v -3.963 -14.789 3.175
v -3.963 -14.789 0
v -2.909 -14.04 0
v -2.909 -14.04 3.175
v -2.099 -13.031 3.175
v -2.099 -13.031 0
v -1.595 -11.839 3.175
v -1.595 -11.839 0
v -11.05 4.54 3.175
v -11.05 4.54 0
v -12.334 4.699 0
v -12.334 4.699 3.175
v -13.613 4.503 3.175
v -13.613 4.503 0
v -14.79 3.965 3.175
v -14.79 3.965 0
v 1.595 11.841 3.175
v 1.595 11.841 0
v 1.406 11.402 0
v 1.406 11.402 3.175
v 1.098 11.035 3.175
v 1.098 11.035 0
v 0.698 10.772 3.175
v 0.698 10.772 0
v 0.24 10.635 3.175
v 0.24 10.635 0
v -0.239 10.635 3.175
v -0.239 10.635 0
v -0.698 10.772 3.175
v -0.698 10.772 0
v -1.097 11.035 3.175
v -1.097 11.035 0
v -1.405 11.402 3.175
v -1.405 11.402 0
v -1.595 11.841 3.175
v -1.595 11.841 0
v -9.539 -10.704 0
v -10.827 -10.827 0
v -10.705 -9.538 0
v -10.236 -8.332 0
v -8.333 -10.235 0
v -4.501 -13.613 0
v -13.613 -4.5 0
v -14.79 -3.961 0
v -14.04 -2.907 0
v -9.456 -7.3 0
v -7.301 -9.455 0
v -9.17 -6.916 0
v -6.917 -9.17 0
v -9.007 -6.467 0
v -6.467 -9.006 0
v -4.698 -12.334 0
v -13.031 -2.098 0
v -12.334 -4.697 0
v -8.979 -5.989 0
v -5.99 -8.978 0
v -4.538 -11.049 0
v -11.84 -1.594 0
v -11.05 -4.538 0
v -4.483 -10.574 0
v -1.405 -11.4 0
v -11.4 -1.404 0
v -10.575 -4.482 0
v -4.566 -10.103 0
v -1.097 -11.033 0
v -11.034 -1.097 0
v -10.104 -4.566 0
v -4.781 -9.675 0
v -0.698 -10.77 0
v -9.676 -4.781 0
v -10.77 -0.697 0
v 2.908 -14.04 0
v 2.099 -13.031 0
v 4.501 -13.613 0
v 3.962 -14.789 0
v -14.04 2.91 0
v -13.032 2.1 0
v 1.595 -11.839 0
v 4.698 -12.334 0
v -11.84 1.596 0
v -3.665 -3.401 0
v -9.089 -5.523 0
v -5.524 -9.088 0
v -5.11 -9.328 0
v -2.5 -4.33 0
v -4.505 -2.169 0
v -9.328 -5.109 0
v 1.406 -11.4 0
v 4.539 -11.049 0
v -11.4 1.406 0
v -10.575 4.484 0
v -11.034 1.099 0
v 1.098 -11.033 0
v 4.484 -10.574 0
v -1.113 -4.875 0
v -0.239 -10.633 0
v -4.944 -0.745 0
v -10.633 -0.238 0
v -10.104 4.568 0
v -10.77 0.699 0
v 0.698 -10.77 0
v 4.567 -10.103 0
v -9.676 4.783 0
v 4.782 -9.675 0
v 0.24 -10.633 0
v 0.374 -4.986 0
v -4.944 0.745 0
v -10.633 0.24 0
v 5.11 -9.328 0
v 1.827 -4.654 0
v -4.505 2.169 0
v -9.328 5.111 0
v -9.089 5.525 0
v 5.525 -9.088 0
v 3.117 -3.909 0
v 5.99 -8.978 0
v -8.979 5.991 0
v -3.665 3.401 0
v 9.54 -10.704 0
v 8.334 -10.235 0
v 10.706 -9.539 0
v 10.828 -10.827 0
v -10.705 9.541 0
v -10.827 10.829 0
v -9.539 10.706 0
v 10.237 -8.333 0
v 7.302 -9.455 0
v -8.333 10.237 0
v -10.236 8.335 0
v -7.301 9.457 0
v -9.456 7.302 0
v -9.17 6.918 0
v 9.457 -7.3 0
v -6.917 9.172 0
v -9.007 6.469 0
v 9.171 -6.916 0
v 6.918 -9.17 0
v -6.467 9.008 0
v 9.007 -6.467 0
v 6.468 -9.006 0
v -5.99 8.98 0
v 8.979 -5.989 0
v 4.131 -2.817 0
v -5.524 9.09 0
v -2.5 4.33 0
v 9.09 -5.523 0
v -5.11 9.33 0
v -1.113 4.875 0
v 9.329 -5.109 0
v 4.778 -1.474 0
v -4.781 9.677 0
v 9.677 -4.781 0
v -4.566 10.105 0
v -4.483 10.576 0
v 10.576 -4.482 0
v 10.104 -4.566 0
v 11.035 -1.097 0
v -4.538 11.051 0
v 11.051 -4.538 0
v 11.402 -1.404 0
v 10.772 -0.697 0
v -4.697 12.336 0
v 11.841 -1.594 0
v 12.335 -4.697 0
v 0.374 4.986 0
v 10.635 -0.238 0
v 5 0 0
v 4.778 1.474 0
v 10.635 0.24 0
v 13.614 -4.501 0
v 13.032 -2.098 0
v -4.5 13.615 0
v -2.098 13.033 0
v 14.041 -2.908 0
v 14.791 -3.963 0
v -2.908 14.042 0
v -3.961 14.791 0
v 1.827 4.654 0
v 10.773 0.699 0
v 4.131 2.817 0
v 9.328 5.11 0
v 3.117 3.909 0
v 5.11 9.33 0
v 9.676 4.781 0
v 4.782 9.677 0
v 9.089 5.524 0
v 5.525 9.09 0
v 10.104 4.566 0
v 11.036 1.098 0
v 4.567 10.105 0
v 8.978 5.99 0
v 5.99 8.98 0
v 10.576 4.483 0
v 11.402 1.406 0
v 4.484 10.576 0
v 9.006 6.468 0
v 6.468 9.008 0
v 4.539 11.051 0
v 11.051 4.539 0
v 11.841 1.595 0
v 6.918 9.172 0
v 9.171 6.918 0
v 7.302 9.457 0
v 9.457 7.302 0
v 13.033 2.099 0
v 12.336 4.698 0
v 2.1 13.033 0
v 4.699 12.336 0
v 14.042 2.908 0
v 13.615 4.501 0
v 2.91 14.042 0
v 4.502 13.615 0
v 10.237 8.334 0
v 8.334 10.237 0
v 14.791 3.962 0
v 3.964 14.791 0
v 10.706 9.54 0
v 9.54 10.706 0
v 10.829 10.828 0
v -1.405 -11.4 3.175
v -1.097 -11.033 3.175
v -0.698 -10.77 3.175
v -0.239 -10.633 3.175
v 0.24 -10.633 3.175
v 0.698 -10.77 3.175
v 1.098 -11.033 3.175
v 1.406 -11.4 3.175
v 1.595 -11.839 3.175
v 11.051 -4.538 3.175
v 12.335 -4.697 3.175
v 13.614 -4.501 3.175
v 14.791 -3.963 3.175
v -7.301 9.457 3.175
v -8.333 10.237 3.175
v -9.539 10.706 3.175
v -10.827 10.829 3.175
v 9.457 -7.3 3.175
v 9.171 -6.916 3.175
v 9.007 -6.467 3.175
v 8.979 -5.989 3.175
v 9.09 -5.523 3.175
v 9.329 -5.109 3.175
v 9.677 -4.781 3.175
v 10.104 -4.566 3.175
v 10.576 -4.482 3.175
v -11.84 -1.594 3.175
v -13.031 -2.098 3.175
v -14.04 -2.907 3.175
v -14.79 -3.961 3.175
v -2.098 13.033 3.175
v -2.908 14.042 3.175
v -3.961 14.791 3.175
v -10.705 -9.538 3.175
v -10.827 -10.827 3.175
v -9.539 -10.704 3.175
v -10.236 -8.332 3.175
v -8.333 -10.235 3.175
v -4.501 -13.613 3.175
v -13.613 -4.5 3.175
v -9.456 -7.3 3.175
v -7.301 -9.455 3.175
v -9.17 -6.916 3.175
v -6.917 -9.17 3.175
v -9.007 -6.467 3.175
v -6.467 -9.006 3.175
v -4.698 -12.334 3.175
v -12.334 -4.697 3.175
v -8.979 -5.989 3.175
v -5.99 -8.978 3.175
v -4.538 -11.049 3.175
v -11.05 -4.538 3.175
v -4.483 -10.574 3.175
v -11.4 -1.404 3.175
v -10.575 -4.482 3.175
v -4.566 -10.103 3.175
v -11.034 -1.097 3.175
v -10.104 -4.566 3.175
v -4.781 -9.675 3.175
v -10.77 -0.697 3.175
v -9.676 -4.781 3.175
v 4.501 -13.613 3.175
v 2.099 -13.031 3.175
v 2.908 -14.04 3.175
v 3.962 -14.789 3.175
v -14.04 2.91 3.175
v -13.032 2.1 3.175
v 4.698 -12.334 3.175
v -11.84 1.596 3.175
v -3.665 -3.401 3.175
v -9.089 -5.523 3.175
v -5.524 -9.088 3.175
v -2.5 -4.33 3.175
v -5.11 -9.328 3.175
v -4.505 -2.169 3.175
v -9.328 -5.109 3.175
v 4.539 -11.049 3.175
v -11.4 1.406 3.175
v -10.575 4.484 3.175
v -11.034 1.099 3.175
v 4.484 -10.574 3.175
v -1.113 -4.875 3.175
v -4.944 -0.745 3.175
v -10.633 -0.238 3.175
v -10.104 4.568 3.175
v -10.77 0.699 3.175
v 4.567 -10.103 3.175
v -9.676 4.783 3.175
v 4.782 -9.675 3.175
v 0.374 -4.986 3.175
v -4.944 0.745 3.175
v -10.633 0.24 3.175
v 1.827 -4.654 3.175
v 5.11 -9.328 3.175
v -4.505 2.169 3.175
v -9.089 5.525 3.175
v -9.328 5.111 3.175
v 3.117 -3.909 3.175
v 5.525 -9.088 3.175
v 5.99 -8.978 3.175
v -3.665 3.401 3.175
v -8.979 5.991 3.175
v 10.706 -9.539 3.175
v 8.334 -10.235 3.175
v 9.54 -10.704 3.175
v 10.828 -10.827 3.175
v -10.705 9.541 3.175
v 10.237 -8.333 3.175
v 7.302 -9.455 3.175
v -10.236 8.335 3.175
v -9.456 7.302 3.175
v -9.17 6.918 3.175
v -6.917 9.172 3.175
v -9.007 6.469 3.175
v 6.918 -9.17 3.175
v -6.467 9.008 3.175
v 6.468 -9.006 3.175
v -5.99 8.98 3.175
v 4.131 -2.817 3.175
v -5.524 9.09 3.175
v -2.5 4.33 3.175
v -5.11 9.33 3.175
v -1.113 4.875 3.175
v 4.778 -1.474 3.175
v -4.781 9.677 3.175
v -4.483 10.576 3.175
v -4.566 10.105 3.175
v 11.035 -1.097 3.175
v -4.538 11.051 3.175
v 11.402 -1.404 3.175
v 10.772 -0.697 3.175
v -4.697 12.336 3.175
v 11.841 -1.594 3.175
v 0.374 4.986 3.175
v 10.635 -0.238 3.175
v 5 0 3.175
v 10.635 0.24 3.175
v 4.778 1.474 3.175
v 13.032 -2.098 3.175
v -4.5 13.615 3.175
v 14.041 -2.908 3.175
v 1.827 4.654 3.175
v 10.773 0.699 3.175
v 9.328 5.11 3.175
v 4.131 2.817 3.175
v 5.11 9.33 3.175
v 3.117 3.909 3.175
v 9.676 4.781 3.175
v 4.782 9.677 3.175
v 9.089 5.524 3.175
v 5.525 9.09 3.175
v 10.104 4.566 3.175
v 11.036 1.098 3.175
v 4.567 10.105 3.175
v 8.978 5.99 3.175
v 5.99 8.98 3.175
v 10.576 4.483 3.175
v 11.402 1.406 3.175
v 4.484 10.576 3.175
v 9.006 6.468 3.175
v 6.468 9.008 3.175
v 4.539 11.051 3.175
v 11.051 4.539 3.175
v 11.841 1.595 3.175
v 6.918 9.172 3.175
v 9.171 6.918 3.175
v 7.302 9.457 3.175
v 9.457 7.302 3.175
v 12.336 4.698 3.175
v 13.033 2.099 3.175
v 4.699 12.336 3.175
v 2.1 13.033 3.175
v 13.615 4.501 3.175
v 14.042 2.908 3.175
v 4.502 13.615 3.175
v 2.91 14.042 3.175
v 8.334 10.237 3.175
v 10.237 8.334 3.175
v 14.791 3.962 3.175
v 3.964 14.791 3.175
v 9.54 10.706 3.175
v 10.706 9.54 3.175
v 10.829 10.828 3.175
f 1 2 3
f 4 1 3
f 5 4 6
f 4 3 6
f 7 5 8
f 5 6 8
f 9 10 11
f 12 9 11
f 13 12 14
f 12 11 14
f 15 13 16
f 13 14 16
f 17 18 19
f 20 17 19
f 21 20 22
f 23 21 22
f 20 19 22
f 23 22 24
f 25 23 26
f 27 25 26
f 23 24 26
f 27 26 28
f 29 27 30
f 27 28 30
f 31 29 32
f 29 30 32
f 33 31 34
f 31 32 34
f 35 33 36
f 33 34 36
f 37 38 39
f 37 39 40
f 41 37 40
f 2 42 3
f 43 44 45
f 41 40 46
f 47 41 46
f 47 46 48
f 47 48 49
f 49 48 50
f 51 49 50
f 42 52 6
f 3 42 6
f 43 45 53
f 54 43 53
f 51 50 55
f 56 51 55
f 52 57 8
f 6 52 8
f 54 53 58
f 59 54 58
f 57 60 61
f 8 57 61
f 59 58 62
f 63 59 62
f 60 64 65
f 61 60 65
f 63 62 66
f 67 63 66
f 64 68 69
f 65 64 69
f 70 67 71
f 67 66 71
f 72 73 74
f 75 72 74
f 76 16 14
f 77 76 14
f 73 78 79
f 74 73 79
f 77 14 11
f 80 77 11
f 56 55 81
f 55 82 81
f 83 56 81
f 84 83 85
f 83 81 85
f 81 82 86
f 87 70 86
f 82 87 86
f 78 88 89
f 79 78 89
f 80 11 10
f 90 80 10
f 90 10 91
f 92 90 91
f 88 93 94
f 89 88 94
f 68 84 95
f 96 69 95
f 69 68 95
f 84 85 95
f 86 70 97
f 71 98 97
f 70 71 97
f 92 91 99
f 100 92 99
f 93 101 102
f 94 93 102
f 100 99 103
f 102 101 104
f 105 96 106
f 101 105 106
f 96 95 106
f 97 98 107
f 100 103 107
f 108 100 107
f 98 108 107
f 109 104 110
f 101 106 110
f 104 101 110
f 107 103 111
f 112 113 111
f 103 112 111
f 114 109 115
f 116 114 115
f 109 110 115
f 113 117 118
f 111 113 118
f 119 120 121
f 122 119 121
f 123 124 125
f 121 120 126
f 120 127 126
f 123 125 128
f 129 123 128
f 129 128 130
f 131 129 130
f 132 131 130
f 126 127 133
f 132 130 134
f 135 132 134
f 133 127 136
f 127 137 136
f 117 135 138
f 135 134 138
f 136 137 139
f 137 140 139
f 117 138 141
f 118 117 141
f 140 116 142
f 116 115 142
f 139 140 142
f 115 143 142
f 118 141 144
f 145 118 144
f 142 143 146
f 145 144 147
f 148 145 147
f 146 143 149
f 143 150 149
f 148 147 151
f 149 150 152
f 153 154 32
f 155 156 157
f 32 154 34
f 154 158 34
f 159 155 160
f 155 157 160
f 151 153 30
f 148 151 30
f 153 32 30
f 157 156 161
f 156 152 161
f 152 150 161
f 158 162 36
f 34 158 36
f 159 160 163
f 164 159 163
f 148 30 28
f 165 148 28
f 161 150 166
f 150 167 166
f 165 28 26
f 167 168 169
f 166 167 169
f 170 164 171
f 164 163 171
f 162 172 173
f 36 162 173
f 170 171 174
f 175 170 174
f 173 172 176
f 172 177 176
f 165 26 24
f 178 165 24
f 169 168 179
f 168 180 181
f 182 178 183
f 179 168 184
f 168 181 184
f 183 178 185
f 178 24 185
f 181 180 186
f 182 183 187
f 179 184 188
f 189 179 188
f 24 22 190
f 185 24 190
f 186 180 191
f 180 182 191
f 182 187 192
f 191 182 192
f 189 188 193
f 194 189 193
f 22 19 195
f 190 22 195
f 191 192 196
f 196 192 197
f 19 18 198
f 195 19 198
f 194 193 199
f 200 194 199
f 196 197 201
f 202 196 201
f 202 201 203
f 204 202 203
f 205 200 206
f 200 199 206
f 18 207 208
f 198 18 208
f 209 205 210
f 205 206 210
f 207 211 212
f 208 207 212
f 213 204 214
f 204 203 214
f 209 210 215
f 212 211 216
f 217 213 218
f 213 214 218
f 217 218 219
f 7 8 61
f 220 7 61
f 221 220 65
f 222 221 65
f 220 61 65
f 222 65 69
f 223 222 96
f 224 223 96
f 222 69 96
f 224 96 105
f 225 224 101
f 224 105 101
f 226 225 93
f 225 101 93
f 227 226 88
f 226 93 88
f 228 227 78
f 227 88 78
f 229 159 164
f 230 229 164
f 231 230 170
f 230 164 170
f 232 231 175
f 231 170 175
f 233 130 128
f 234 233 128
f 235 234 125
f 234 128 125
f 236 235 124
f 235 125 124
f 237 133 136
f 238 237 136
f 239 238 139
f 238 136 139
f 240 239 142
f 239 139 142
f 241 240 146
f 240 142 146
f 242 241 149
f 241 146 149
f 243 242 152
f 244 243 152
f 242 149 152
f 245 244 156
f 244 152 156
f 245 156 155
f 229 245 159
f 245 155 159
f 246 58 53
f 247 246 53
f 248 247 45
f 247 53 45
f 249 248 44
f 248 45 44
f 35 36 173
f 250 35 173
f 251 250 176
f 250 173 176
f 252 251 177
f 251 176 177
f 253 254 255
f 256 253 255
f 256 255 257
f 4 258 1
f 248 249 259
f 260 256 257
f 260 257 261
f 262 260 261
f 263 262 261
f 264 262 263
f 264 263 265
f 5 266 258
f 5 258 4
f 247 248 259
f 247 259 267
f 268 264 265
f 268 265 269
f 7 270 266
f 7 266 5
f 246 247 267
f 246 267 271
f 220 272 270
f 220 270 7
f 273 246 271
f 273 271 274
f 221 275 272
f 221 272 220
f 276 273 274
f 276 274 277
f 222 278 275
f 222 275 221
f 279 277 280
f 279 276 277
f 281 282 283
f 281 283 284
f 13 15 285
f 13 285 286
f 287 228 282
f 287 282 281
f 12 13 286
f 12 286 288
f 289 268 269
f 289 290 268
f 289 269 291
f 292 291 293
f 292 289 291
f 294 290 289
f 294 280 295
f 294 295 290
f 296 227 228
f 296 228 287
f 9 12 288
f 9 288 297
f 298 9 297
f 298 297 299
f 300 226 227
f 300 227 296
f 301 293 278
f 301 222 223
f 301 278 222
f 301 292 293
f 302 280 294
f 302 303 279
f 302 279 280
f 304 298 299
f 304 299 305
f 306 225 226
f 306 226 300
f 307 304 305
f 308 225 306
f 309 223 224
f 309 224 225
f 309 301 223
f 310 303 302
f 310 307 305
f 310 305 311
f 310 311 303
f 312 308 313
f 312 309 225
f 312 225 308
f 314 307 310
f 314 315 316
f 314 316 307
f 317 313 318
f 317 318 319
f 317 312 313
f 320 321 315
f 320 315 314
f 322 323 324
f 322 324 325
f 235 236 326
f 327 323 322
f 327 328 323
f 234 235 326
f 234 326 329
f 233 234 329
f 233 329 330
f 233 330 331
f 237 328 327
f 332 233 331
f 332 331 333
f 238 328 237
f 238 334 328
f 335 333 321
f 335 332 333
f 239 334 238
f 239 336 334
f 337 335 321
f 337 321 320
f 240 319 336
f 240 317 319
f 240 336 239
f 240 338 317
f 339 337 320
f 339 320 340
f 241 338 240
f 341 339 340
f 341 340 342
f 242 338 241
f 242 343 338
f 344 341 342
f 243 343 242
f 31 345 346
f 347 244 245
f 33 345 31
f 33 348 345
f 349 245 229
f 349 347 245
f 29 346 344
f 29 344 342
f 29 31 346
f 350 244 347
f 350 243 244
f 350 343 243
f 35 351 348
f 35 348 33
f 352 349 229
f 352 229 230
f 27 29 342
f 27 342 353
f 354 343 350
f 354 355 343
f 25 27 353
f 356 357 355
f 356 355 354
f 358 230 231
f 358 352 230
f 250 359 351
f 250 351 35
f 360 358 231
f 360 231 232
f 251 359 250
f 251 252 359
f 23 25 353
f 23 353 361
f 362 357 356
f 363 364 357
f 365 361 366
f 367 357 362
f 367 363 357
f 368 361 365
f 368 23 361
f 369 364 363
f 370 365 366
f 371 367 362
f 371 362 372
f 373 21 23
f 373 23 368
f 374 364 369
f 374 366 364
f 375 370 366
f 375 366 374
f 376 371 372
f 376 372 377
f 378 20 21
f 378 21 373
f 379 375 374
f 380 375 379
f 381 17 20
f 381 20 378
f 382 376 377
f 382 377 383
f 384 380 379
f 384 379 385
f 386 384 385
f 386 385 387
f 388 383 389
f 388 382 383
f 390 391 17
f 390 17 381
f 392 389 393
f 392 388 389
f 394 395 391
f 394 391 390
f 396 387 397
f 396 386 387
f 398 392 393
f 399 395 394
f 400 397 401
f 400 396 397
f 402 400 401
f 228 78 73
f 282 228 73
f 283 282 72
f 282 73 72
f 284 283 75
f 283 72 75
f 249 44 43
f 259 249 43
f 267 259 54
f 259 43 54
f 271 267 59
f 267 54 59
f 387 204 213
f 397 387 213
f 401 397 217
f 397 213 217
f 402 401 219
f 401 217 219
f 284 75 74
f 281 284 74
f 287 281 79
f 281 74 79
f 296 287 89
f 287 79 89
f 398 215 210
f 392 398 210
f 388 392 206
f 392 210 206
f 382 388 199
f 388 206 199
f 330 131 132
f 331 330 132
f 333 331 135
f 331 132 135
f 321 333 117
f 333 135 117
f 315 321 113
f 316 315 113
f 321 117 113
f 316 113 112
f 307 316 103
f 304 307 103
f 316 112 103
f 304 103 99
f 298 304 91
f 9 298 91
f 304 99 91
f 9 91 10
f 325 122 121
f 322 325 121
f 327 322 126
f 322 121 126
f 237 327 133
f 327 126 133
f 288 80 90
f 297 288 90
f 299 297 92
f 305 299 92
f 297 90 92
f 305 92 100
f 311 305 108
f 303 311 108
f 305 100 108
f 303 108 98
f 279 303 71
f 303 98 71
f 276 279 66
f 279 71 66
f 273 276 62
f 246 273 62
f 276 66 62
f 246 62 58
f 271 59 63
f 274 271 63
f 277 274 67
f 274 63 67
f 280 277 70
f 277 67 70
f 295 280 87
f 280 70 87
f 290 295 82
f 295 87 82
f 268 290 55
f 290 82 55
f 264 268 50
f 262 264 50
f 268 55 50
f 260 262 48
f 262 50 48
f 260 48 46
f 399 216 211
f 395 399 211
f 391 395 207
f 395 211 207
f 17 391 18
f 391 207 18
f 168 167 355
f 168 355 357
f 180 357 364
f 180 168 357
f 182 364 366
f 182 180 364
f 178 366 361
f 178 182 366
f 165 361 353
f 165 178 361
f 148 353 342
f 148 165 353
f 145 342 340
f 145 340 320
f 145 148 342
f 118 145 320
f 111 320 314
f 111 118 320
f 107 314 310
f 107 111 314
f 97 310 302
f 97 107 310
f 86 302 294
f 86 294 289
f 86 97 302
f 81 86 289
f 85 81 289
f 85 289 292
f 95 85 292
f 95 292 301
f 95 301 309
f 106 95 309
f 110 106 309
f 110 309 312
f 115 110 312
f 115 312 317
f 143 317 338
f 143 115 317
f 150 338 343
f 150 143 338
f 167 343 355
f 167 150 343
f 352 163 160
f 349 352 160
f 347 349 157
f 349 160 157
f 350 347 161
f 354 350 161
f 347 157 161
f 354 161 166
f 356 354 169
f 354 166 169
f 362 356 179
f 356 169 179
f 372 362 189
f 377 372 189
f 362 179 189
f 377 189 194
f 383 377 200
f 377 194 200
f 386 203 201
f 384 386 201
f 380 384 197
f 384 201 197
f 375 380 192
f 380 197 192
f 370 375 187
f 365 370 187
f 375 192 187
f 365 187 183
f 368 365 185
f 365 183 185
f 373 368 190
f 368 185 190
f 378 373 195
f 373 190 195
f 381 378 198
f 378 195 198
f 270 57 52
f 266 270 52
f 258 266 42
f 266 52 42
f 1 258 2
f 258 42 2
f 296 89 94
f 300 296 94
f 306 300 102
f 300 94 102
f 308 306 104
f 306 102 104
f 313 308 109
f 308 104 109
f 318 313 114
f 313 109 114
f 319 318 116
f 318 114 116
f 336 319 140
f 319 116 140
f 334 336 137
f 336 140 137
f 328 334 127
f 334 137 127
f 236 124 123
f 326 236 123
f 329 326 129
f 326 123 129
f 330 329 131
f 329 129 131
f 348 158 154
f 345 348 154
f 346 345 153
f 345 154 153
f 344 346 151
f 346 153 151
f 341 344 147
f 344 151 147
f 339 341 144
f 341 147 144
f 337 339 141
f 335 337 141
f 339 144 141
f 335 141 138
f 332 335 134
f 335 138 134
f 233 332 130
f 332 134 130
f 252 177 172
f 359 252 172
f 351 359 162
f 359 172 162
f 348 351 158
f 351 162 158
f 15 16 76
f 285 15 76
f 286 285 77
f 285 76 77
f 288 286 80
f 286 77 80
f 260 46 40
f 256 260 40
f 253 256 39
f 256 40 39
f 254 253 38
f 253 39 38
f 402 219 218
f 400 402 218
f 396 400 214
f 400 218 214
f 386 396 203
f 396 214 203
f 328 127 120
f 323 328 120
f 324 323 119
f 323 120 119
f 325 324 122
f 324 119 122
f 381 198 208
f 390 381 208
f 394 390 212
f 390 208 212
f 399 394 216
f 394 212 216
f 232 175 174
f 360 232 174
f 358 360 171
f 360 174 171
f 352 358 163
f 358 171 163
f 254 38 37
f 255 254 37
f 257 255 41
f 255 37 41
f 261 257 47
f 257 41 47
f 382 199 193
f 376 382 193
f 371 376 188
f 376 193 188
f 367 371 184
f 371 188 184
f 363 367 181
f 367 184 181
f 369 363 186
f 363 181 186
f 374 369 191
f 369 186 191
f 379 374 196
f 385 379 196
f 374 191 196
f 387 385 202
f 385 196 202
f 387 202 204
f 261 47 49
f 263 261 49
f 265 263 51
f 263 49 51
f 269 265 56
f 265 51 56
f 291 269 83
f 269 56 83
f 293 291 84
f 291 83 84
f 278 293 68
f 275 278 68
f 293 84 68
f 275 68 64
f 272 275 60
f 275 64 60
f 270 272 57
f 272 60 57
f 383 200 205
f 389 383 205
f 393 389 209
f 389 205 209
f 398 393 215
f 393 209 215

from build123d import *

# Parameters (mm, degrees)
SKETCH2_R           = 5
BOSS_EXTRUDE2_DEPTH = 3.175


with BuildPart() as part:
    # Sketch2 → Boss-Extrude2 (new body)
    with BuildSketch(Plane.XY):
        with BuildLine():
            ThreePointArc((9.456794765, 7.302125235), (10.51328966, 8.920913041), (10.82870315, 10.828049574))
            ThreePointArc((10.82870315, 10.828049574), (8.921045244, 10.513465667), (7.301533296, 9.457386704))
            ThreePointArc((7.301533296, 9.457386704), (5.308889045, 9.194845217), (4.539183834, 11.051485471))
            ThreePointArc((4.539183834, 11.051485471), (4.64471403, 12.981928422), (3.964051405, 14.791471183))
            ThreePointArc((3.964051405, 14.791471183), (2.469674584, 13.565372247), (1.59532555, 11.841424903))
            ThreePointArc((1.59532555, 11.841424903), (0.000409384, 10.617090374), (-1.594506782, 11.841424903))
            ThreePointArc((-1.594506782, 11.841424903), (-2.468043552, 13.565085875), (-3.961395494, 14.791451895))
            ThreePointArc((-3.961395494, 14.791451895), (-4.64300424, 12.982116437), (-4.538365066, 11.051485471))
            ThreePointArc((-4.538365066, 11.051485471), (-5.308070277, 9.194845217), (-7.300714528, 9.457386704))
            ThreePointArc((-7.300714528, 9.457386704), (-8.919846484, 10.513683908), (-10.827230806, 10.82870315))
            ThreePointArc((-10.827230806, 10.82870315), (-10.512252617, 8.921293027), (-9.455975997, 7.302125235))
            ThreePointArc((-9.455975997, 7.302125235), (-9.19343451, 5.309480984), (-11.050074764, 4.539775774))
            ThreePointArc((-11.050074764, 4.539775774), (-12.980517715, 4.64530597), (-14.790060475, 3.964643344))
            ThreePointArc((-14.790060475, 3.964643344), (-13.56396154, 2.470266524), (-11.840014195, 1.595917489))
            ThreePointArc((-11.840014195, 1.595917489), (-10.615679667, 0.001001323), (-11.840014195, -1.593914842))
            ThreePointArc((-11.840014195, -1.593914842), (-13.563675168, -2.467451613), (-14.790041187, -3.960803554))
            ThreePointArc((-14.790041187, -3.960803554), (-12.980705729, -4.6424123), (-11.050074764, -4.537773127))
            ThreePointArc((-11.050074764, -4.537773127), (-9.19343451, -5.307478337), (-9.455975997, -7.300122588))
            ThreePointArc((-9.455975997, -7.300122588), (-10.512273201, -8.919254544), (-10.827292443, -10.826638866))
            ThreePointArc((-10.827292443, -10.826638866), (-8.91988232, -10.511660678), (-7.300714528, -9.455384057))
            ThreePointArc((-7.300714528, -9.455384057), (-5.308070277, -9.19284257), (-4.538365066, -11.049482824))
            ThreePointArc((-4.538365066, -11.049482824), (-4.643895262, -12.979925775), (-3.963232637, -14.789468536))
            ThreePointArc((-3.963232637, -14.789468536), (-2.468855816, -13.5633696), (-1.594506782, -11.839422256))
            ThreePointArc((-1.594506782, -11.839422256), (0.000409384, -10.615087727), (1.59532555, -11.839422256))
            ThreePointArc((1.59532555, -11.839422256), (2.46886232, -13.563083228), (3.962214262, -14.789449248))
            ThreePointArc((3.962214262, -14.789449248), (4.643823008, -12.98011379), (4.539183834, -11.049482824))
            ThreePointArc((4.539183834, -11.049482824), (5.308889045, -9.19284257), (7.301533296, -9.455384057))
            ThreePointArc((7.301533296, -9.455384057), (8.920665252, -10.511681261), (10.828049574, -10.826700503))
            ThreePointArc((10.828049574, -10.826700503), (10.513071385, -8.91929038), (9.456794765, -7.300122588))
            ThreePointArc((9.456794765, -7.300122588), (9.194253278, -5.307478337), (11.050893532, -4.537773127))
            ThreePointArc((11.050893532, -4.537773127), (12.981336483, -4.643303323), (14.790879243, -3.962640697))
            ThreePointArc((14.790879243, -3.962640697), (13.564780308, -2.468263877), (11.840832964, -1.593914842))
            ThreePointArc((11.840832964, -1.593914842), (10.617899153, 0.000932392), (11.841424903, 1.59532555))
            ThreePointArc((11.841424903, 1.59532555), (13.565085875, 2.46886232), (14.791451895, 3.962214262))
            ThreePointArc((14.791451895, 3.962214262), (12.982116437, 4.643823008), (11.051485471, 4.539183834))
            ThreePointArc((11.051485471, 4.539183834), (9.193282623, 5.308357949), (9.456794765, 7.302125235))
        make_face()
        Circle(SKETCH2_R, mode=Mode.SUBTRACT)
    extrude(amount=BOSS_EXTRUDE2_DEPTH)


solid = part.part
